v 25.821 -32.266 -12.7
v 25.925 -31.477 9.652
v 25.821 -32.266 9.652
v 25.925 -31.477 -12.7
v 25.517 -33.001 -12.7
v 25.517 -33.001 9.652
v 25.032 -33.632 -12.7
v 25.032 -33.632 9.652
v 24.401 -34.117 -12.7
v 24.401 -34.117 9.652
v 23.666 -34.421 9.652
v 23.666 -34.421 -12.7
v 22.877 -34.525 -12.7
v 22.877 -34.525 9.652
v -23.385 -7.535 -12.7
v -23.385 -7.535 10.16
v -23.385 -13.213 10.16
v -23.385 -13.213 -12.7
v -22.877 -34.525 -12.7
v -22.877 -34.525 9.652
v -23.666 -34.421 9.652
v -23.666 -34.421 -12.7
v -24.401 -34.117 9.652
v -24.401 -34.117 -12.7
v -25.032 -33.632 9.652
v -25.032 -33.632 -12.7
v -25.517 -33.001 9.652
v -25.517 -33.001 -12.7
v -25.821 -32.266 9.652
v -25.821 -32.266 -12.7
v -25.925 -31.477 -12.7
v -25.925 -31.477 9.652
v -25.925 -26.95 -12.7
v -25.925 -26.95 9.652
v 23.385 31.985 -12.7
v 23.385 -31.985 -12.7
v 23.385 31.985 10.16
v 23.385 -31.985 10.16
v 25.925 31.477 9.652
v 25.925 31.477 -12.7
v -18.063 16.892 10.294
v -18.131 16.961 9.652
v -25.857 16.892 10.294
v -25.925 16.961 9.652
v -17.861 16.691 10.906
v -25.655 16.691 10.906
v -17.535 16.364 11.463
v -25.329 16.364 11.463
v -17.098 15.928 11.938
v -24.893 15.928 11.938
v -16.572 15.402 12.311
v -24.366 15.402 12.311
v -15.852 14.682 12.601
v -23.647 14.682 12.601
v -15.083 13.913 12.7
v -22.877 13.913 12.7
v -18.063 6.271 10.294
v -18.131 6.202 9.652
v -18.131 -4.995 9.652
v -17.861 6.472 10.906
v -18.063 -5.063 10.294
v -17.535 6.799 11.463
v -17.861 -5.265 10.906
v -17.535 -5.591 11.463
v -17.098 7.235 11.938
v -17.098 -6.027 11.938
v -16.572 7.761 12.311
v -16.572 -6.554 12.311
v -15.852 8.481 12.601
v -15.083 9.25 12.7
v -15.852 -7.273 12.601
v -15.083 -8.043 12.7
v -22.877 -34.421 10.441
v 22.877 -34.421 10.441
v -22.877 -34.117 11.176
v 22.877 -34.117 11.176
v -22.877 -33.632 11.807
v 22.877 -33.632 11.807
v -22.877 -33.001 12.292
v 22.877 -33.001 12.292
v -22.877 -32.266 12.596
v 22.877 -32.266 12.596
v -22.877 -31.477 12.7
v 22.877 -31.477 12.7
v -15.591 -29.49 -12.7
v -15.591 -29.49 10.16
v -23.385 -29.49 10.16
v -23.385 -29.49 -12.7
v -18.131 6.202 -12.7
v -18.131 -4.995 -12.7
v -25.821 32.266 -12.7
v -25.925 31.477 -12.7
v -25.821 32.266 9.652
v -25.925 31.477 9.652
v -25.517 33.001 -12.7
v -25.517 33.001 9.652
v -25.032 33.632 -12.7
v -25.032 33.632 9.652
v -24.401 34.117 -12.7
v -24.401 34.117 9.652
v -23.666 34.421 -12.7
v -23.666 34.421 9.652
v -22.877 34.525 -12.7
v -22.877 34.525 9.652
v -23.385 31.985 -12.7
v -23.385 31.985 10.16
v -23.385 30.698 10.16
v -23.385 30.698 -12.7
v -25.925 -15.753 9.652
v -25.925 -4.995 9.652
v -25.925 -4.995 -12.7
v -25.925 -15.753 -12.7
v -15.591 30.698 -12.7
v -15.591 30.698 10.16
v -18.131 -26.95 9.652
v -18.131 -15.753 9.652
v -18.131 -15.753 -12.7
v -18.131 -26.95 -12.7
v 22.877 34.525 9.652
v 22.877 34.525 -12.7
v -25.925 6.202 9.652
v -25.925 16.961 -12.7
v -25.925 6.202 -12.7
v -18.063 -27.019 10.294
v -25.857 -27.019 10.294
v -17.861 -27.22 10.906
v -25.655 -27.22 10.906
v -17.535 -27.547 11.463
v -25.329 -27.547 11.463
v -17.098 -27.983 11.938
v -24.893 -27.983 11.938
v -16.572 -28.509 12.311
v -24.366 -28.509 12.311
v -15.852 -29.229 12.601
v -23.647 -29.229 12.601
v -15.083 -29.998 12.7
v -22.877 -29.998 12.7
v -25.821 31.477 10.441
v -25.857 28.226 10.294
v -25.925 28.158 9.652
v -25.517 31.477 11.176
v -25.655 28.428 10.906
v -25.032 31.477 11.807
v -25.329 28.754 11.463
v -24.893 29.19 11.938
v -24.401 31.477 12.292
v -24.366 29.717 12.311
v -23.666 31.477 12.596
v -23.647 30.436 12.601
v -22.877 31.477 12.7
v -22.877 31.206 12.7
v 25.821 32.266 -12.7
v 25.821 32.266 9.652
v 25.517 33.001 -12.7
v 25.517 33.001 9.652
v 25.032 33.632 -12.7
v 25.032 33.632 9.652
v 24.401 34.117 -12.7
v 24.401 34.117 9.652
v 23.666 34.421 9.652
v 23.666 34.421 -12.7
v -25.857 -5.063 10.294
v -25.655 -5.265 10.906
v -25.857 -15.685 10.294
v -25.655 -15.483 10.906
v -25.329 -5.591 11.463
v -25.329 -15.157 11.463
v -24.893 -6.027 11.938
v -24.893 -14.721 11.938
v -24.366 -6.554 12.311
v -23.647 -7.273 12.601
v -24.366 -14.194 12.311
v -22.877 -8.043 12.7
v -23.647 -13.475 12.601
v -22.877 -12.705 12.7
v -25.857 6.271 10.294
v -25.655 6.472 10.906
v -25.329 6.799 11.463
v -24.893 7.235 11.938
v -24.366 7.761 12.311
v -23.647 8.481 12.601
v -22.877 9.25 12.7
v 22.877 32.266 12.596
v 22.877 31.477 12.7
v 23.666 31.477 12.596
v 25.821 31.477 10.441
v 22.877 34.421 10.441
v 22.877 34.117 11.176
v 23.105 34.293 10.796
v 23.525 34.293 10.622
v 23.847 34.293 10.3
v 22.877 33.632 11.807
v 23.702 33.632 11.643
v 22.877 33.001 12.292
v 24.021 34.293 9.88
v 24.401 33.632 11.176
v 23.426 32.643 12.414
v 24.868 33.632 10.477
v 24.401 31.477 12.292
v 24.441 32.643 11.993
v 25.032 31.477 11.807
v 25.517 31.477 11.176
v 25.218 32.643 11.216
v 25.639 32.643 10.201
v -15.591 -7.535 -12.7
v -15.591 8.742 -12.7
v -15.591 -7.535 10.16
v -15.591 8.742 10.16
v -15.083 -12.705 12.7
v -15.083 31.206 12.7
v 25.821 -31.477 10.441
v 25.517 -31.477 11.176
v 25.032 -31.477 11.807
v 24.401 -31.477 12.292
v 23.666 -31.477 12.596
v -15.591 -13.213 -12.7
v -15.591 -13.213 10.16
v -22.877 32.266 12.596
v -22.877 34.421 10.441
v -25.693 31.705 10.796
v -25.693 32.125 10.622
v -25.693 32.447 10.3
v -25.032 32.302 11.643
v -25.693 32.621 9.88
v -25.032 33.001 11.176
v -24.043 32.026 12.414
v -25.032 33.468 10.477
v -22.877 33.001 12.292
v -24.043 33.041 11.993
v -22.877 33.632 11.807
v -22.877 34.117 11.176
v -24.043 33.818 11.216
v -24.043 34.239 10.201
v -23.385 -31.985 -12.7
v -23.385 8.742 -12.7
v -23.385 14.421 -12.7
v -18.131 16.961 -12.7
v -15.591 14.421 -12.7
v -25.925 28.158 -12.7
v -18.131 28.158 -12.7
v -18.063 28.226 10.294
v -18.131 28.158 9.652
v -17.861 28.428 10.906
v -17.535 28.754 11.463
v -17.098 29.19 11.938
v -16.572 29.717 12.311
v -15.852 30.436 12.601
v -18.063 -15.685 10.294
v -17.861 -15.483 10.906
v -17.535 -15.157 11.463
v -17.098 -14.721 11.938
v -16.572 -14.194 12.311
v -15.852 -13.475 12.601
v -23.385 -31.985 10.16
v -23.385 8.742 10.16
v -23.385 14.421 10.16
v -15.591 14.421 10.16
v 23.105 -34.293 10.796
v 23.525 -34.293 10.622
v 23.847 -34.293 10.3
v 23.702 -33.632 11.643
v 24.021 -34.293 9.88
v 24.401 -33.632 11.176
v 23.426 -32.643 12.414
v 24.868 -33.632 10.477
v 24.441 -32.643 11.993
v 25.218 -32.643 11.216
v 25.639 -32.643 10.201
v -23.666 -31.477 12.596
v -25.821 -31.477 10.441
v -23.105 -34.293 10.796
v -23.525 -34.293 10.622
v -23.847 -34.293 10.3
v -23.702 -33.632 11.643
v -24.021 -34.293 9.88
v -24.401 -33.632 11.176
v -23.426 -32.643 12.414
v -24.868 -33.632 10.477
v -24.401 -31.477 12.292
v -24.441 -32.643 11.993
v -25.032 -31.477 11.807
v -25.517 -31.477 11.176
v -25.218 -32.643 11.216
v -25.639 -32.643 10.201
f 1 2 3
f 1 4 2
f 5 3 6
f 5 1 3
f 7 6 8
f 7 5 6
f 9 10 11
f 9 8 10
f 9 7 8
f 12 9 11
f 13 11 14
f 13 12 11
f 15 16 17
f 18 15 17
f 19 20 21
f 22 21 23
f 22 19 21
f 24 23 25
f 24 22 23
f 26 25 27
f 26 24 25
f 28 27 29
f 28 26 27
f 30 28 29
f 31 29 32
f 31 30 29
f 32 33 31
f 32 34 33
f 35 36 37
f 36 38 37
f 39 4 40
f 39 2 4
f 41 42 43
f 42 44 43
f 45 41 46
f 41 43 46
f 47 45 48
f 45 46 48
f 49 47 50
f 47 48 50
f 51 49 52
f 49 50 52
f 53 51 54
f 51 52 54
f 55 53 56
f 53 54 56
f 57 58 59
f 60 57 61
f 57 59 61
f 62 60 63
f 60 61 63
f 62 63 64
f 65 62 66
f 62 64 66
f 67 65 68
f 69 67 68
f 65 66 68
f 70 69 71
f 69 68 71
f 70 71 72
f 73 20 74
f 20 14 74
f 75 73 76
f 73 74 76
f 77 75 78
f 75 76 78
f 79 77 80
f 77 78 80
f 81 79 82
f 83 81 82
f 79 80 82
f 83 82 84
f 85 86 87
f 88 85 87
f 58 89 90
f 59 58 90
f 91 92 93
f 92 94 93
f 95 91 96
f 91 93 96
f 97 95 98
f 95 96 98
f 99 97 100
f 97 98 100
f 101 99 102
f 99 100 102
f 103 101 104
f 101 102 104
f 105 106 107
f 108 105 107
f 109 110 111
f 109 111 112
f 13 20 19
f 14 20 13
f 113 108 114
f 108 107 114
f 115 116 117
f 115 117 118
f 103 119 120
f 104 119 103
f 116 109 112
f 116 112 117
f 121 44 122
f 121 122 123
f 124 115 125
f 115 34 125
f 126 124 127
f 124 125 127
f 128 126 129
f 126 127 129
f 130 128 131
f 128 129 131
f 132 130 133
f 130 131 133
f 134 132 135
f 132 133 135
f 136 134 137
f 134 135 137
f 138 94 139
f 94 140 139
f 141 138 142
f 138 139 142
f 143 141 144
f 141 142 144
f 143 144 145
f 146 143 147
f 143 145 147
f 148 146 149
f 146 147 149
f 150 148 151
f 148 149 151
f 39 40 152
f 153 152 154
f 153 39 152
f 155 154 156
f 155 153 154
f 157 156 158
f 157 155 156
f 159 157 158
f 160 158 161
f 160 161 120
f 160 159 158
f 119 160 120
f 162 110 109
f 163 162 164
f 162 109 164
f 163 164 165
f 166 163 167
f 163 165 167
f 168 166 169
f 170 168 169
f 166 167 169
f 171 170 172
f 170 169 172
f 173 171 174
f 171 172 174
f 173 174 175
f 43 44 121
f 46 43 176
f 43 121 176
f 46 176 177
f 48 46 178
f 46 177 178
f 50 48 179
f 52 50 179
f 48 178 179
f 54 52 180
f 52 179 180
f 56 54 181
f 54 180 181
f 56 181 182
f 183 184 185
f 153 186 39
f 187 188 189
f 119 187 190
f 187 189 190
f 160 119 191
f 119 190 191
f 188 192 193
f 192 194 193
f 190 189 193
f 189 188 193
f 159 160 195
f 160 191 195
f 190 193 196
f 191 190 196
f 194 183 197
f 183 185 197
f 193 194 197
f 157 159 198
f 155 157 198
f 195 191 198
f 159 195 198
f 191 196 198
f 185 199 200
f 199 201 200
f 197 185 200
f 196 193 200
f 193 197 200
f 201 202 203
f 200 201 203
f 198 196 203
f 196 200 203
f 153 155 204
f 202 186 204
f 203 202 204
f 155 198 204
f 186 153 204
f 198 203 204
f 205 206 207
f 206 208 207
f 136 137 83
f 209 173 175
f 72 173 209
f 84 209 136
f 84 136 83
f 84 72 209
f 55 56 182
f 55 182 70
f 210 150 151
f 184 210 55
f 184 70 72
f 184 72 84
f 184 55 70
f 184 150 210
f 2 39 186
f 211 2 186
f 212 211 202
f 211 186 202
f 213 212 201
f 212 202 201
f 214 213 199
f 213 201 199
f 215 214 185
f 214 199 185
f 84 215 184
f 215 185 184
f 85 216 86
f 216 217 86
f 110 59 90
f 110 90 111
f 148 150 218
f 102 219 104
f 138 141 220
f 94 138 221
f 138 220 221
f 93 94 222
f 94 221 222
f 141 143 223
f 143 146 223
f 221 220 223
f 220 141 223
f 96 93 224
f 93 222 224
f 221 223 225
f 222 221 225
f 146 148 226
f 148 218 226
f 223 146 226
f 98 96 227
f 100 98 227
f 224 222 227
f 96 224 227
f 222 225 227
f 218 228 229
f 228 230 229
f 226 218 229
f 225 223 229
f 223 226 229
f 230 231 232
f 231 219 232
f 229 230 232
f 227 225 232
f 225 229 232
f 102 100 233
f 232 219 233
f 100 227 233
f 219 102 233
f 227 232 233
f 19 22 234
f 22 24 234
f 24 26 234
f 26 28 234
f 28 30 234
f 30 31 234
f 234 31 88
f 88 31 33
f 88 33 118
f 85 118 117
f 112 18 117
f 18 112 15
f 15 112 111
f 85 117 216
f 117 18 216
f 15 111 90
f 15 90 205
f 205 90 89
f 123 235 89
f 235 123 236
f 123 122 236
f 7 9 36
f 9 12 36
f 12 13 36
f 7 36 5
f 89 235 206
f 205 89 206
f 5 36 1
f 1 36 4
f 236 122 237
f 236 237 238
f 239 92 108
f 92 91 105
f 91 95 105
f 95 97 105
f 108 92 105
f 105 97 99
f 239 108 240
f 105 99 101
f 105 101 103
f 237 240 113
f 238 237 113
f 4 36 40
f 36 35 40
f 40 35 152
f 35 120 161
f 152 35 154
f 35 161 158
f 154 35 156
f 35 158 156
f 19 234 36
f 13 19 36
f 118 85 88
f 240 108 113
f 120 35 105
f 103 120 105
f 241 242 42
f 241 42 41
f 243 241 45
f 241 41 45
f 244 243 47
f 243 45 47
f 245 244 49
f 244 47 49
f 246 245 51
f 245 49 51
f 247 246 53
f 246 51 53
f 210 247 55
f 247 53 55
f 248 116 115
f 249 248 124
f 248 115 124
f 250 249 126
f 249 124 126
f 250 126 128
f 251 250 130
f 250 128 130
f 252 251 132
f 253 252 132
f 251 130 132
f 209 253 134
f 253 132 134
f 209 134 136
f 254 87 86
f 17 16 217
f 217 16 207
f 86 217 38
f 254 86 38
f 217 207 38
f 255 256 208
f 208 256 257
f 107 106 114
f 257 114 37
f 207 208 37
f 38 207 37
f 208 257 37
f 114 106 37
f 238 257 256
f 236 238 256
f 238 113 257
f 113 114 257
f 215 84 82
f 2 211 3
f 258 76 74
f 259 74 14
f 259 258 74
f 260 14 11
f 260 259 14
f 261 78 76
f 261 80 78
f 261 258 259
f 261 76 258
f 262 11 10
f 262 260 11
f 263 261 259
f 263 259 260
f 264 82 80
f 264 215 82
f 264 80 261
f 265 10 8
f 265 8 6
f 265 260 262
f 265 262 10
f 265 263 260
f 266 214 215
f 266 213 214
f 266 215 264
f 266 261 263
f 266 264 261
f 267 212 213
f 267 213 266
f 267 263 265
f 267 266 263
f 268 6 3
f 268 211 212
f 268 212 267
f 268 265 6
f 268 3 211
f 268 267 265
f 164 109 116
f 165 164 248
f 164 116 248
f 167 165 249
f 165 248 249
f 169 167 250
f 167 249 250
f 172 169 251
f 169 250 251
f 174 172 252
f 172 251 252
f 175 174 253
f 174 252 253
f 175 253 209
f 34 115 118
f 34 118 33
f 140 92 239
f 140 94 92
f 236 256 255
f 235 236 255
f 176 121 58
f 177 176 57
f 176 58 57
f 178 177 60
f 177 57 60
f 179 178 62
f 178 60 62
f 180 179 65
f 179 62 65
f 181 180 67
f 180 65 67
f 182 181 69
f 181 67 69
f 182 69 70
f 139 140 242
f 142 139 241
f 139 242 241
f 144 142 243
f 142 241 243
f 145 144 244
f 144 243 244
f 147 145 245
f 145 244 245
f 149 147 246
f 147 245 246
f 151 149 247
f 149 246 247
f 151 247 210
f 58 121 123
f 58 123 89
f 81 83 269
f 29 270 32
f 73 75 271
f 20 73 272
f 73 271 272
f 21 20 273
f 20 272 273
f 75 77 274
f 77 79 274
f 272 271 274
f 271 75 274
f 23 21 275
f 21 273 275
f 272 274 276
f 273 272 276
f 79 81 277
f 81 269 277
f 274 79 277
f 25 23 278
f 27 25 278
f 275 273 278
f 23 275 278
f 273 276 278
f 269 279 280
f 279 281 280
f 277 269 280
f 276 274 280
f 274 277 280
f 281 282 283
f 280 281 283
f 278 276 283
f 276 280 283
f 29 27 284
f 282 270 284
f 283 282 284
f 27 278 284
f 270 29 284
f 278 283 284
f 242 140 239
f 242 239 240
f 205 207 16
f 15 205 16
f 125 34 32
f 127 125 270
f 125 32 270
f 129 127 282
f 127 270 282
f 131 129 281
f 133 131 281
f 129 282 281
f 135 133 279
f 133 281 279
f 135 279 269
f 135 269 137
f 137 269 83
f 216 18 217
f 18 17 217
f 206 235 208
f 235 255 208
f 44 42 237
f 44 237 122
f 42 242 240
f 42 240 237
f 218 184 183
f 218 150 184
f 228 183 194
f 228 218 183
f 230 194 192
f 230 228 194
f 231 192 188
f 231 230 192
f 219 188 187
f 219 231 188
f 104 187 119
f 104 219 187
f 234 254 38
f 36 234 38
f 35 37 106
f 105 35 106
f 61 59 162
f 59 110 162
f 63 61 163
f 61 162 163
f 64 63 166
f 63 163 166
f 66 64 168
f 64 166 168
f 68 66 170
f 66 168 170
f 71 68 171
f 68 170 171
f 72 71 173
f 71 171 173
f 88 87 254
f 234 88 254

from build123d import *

# Parameters (mm, degrees)
F1_DEPTH = 12.7
F2_T     = -2.54
F3_R     = 3.048


with BuildPart() as f1:
    # F0 (on Top) → F1 (new body, symmetric)
    with BuildSketch(Plane.XY):
        Polygon((25.92500022, -34.52499953), (25.92500022, 34.52499953), (-25.92500022, 34.52499953), (-25.92500022, 28.157905028), (-18.1308021206, 28.157905028), (-18.1308021206, 16.960619828), (-25.92500022, 16.960619828), (-25.92500022, 6.202424428), (-18.1308021206, 6.202424428), (-18.1308021206, -4.9948727434), (-25.92500022, -4.9948727434), (-25.92500022, -15.7530735209), (-18.1308021206, -15.7530735209), (-18.1308021206, -26.9503587209), (-25.92500022, -26.9503587209), (-25.92500022, -34.52499953), align=None)
    extrude(amount=F1_DEPTH, both=True)

    # F2
    f2_openings = [f1.faces().sort_by_distance(p)[0] for p in [
        (1.73799, -0.047637, -12.7),
    ]]
    offset(amount=F2_T, openings=f2_openings, kind=Kind.INTERSECTION)

    # F3
    f3_edges = [f1.edges().sort_by_distance(p)[0] for p in [
        (25.925, 0, 12.7),
        (0, 34.525, 12.7),
        (-25.925, 31.341452, 12.7),
        (-18.130802, 22.559262, 12.7),
        (-22.027901, 16.96062, 12.7),
        (-25.925, 11.581522, 12.7),
        (-22.027901, 6.202424, 12.7),
        (-18.130802, 0.603776, 12.7),
        (-22.027901, -4.994873, 12.7),
        (-25.925, -10.373973, 12.7),
        (-22.027901, -15.753074, 12.7),
        (-18.130802, -21.351716, 12.7),
        (-22.027901, -26.950359, 12.7),
        (-25.925, -30.737679, 12.7),
        (0, -34.525, 12.7),
        (-22.027901, 28.157905, 12.7),
        (-25.925, -34.525, 0),
        (25.925, -34.525, 0),
        (25.925, 34.525, 0),
        (-25.925, 34.525, 0),
    ]]
    fillet(f3_edges, radius=F3_R)


solid = f1.part
